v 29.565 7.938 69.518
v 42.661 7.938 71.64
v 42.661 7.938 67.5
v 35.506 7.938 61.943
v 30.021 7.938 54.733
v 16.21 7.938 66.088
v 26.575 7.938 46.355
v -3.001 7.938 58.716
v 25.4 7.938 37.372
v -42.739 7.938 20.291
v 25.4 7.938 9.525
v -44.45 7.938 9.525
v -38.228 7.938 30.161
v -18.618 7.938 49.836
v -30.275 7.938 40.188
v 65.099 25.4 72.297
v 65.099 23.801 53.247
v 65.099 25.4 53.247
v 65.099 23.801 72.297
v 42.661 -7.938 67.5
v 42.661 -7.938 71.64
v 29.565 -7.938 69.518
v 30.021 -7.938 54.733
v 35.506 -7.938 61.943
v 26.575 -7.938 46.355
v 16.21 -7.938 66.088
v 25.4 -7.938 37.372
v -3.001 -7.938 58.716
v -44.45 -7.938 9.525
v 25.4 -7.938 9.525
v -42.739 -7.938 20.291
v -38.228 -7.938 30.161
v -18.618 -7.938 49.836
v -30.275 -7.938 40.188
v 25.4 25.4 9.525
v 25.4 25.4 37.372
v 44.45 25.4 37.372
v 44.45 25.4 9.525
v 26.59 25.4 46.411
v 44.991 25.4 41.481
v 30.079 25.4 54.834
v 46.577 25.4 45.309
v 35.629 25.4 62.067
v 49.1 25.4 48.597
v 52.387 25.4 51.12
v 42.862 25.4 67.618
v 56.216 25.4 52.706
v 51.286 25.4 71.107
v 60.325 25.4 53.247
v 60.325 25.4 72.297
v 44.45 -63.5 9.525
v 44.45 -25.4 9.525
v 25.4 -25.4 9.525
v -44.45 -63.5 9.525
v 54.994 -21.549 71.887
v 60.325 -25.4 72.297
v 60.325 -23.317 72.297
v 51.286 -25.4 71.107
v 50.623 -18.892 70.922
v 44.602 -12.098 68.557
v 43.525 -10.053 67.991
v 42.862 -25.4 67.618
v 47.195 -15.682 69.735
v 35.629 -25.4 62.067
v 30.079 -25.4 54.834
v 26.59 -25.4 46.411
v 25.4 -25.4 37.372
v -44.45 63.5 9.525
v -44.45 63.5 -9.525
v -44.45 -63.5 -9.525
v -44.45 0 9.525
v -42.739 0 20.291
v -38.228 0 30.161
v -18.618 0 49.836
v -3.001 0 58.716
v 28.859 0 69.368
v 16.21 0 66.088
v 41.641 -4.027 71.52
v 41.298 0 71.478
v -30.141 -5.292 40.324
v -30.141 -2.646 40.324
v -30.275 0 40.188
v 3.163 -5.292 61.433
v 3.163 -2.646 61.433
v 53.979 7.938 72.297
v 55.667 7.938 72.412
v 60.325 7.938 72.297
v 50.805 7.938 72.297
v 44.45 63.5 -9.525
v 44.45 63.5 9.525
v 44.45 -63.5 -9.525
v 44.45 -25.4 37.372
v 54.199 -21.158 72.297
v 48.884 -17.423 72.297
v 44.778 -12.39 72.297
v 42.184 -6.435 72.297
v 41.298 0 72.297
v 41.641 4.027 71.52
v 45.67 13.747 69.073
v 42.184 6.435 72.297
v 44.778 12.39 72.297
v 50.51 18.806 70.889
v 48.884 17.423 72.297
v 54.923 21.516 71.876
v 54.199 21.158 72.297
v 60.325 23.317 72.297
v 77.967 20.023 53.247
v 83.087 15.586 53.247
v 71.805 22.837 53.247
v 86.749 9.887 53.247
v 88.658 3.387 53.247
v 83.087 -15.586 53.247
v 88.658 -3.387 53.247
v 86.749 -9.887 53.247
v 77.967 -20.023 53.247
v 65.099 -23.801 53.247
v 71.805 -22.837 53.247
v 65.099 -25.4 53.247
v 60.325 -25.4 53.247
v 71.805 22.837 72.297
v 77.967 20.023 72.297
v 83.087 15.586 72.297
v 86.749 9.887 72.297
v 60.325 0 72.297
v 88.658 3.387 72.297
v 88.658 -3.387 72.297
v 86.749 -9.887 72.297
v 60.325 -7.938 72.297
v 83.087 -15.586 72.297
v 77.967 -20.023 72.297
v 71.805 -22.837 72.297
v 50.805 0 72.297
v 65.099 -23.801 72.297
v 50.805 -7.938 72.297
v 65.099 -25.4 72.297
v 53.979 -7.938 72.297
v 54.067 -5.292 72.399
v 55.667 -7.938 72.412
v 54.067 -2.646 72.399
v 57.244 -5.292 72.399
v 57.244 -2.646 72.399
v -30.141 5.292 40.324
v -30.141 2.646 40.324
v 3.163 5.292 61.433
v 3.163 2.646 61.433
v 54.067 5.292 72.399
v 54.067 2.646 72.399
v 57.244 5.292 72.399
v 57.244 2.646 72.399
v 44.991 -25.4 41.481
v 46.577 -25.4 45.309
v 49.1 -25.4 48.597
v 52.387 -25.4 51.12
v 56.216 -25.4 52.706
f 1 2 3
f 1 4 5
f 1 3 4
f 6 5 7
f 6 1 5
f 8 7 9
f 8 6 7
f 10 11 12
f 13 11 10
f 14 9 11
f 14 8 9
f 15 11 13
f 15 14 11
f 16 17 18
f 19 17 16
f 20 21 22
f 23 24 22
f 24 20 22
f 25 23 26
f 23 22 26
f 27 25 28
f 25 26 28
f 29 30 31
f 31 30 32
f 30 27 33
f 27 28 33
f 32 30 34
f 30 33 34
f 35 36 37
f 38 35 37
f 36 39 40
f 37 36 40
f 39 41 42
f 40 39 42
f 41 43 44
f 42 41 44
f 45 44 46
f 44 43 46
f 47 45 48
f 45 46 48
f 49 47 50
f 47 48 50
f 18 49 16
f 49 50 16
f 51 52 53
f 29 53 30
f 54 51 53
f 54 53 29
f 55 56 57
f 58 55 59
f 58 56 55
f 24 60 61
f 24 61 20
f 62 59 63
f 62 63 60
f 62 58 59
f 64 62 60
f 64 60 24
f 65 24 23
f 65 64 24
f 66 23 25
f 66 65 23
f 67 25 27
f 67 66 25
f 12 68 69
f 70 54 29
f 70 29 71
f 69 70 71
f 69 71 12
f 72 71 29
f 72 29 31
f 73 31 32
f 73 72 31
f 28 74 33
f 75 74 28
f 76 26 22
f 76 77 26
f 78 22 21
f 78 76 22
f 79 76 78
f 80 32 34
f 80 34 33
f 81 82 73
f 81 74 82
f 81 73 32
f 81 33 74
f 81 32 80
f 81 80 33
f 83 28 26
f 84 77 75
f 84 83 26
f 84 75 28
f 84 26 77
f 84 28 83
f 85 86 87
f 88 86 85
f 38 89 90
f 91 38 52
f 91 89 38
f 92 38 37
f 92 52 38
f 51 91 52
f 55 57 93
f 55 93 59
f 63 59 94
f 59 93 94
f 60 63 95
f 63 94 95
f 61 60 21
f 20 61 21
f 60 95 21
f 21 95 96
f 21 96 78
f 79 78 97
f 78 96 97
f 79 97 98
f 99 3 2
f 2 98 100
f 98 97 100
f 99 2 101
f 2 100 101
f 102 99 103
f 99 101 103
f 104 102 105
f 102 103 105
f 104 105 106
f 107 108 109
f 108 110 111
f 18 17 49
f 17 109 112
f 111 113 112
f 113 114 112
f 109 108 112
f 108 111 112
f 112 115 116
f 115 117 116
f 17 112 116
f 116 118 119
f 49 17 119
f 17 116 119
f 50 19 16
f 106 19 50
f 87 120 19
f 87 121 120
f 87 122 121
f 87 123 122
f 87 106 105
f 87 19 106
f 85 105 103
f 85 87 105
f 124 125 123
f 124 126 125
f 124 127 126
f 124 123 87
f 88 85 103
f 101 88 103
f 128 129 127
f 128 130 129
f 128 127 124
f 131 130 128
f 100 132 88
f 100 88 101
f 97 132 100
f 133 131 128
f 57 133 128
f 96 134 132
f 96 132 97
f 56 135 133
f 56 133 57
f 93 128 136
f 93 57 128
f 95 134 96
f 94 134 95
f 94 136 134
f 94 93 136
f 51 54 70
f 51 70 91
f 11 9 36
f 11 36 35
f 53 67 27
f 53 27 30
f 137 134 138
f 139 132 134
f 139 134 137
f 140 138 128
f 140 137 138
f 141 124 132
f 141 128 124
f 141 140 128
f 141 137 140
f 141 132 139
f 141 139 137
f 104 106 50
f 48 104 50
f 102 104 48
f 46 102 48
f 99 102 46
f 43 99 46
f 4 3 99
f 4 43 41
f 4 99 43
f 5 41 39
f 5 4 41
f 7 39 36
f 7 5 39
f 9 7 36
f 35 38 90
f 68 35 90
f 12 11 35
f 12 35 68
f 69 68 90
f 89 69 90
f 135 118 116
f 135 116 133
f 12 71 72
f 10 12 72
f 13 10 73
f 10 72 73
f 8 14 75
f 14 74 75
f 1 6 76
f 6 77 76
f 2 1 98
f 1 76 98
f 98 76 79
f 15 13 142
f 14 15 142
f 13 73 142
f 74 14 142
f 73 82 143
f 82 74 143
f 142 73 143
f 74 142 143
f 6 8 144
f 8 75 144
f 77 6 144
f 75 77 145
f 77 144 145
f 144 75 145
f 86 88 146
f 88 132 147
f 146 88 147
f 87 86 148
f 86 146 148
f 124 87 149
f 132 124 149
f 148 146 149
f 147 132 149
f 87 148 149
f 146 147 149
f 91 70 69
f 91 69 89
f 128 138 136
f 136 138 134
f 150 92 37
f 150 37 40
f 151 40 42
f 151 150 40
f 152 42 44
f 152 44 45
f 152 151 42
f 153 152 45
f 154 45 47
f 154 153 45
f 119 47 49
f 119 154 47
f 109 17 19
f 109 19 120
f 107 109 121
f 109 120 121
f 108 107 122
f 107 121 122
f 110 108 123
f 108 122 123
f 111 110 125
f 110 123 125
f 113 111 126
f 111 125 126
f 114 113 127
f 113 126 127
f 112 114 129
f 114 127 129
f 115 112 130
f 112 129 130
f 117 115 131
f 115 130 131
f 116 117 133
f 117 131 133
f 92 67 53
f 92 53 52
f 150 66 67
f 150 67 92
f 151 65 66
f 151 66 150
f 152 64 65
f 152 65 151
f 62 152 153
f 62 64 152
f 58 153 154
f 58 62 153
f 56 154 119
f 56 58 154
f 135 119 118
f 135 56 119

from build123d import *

# Parameters (mm, degrees)
F1_DEPTH = 63.5
F2_DEPTH = 25.4
F3_DEPTH = 7.9375
F0_W     = 23.8009692669
F0_H     = 19.05


with BuildPart() as f1:
    # F0 (on Front) → F1 (new body, symmetric)
    with BuildSketch(Plane.XZ):
        Polygon((25.4, 9.525), (-44.45, 9.525), (-44.45, -9.525), (44.45, -9.525), (44.45, 9.525), align=None)
    extrude(amount=F1_DEPTH, both=True)

    # F0 (on Front) → F2 (join, symmetric)
    with BuildSketch(Plane.XZ):
        with BuildLine():
            Line((25.4, 37.3717802988), (25.4, 9.525))
            Line((25.4, 9.525), (44.45, 9.525))
            Line((44.45, 9.525), (44.45, 37.3717802988))
            ThreePointArc((44.45, 37.3717802988), (49.0996798487, 48.5971004502), (60.325, 53.2467802988))
            Line((60.325, 53.2467802988), (65.0990307331, 53.2467802988))
            Line((65.0990307331, 53.2467802988), (65.0990307331, 72.2967802988))
            Line((65.0990307331, 72.2967802988), (60.325, 72.2967802988))
            ThreePointArc((60.325, 72.2967802988), (35.6292956671, 62.0674846318), (25.4, 37.3717802988))
        make_face()
    extrude(amount=F2_DEPTH, both=True)

    # F0 (on Front) → F3 (join, symmetric)
    with BuildSketch(Plane.XZ):
        with BuildLine():
            add(Edge.make_bspline(
                [(-44.45, 9.525), (-43.8166595995, 50.4934750497), (21.2823729962, 74.2796584964), (60.325, 72.2967802988)],
                knots=[0, 0, 0, 0, 122.139661973, 122.139661973, 122.139661973, 122.139661973], degree=3))
            Line((-44.45, 9.525), (25.4, 9.525))
            Line((25.4, 9.525), (25.4, 37.3717802988))
            ThreePointArc((25.4, 37.3717802988), (35.6292956671, 62.0674846318), (60.325, 72.2967802988))
        make_face()
    extrude(amount=F3_DEPTH, both=True)

    # F0 (on Front) → F4 (revolve)
    with BuildSketch(Plane.XZ):
        with Locations((76.9995153666, 62.7717802988)):
            Rectangle(F0_W, F0_H)
    revolve(axis=Axis((65.0990307331, 0, 63.4473668933), (0, 0, -1)))


solid = f1.part
